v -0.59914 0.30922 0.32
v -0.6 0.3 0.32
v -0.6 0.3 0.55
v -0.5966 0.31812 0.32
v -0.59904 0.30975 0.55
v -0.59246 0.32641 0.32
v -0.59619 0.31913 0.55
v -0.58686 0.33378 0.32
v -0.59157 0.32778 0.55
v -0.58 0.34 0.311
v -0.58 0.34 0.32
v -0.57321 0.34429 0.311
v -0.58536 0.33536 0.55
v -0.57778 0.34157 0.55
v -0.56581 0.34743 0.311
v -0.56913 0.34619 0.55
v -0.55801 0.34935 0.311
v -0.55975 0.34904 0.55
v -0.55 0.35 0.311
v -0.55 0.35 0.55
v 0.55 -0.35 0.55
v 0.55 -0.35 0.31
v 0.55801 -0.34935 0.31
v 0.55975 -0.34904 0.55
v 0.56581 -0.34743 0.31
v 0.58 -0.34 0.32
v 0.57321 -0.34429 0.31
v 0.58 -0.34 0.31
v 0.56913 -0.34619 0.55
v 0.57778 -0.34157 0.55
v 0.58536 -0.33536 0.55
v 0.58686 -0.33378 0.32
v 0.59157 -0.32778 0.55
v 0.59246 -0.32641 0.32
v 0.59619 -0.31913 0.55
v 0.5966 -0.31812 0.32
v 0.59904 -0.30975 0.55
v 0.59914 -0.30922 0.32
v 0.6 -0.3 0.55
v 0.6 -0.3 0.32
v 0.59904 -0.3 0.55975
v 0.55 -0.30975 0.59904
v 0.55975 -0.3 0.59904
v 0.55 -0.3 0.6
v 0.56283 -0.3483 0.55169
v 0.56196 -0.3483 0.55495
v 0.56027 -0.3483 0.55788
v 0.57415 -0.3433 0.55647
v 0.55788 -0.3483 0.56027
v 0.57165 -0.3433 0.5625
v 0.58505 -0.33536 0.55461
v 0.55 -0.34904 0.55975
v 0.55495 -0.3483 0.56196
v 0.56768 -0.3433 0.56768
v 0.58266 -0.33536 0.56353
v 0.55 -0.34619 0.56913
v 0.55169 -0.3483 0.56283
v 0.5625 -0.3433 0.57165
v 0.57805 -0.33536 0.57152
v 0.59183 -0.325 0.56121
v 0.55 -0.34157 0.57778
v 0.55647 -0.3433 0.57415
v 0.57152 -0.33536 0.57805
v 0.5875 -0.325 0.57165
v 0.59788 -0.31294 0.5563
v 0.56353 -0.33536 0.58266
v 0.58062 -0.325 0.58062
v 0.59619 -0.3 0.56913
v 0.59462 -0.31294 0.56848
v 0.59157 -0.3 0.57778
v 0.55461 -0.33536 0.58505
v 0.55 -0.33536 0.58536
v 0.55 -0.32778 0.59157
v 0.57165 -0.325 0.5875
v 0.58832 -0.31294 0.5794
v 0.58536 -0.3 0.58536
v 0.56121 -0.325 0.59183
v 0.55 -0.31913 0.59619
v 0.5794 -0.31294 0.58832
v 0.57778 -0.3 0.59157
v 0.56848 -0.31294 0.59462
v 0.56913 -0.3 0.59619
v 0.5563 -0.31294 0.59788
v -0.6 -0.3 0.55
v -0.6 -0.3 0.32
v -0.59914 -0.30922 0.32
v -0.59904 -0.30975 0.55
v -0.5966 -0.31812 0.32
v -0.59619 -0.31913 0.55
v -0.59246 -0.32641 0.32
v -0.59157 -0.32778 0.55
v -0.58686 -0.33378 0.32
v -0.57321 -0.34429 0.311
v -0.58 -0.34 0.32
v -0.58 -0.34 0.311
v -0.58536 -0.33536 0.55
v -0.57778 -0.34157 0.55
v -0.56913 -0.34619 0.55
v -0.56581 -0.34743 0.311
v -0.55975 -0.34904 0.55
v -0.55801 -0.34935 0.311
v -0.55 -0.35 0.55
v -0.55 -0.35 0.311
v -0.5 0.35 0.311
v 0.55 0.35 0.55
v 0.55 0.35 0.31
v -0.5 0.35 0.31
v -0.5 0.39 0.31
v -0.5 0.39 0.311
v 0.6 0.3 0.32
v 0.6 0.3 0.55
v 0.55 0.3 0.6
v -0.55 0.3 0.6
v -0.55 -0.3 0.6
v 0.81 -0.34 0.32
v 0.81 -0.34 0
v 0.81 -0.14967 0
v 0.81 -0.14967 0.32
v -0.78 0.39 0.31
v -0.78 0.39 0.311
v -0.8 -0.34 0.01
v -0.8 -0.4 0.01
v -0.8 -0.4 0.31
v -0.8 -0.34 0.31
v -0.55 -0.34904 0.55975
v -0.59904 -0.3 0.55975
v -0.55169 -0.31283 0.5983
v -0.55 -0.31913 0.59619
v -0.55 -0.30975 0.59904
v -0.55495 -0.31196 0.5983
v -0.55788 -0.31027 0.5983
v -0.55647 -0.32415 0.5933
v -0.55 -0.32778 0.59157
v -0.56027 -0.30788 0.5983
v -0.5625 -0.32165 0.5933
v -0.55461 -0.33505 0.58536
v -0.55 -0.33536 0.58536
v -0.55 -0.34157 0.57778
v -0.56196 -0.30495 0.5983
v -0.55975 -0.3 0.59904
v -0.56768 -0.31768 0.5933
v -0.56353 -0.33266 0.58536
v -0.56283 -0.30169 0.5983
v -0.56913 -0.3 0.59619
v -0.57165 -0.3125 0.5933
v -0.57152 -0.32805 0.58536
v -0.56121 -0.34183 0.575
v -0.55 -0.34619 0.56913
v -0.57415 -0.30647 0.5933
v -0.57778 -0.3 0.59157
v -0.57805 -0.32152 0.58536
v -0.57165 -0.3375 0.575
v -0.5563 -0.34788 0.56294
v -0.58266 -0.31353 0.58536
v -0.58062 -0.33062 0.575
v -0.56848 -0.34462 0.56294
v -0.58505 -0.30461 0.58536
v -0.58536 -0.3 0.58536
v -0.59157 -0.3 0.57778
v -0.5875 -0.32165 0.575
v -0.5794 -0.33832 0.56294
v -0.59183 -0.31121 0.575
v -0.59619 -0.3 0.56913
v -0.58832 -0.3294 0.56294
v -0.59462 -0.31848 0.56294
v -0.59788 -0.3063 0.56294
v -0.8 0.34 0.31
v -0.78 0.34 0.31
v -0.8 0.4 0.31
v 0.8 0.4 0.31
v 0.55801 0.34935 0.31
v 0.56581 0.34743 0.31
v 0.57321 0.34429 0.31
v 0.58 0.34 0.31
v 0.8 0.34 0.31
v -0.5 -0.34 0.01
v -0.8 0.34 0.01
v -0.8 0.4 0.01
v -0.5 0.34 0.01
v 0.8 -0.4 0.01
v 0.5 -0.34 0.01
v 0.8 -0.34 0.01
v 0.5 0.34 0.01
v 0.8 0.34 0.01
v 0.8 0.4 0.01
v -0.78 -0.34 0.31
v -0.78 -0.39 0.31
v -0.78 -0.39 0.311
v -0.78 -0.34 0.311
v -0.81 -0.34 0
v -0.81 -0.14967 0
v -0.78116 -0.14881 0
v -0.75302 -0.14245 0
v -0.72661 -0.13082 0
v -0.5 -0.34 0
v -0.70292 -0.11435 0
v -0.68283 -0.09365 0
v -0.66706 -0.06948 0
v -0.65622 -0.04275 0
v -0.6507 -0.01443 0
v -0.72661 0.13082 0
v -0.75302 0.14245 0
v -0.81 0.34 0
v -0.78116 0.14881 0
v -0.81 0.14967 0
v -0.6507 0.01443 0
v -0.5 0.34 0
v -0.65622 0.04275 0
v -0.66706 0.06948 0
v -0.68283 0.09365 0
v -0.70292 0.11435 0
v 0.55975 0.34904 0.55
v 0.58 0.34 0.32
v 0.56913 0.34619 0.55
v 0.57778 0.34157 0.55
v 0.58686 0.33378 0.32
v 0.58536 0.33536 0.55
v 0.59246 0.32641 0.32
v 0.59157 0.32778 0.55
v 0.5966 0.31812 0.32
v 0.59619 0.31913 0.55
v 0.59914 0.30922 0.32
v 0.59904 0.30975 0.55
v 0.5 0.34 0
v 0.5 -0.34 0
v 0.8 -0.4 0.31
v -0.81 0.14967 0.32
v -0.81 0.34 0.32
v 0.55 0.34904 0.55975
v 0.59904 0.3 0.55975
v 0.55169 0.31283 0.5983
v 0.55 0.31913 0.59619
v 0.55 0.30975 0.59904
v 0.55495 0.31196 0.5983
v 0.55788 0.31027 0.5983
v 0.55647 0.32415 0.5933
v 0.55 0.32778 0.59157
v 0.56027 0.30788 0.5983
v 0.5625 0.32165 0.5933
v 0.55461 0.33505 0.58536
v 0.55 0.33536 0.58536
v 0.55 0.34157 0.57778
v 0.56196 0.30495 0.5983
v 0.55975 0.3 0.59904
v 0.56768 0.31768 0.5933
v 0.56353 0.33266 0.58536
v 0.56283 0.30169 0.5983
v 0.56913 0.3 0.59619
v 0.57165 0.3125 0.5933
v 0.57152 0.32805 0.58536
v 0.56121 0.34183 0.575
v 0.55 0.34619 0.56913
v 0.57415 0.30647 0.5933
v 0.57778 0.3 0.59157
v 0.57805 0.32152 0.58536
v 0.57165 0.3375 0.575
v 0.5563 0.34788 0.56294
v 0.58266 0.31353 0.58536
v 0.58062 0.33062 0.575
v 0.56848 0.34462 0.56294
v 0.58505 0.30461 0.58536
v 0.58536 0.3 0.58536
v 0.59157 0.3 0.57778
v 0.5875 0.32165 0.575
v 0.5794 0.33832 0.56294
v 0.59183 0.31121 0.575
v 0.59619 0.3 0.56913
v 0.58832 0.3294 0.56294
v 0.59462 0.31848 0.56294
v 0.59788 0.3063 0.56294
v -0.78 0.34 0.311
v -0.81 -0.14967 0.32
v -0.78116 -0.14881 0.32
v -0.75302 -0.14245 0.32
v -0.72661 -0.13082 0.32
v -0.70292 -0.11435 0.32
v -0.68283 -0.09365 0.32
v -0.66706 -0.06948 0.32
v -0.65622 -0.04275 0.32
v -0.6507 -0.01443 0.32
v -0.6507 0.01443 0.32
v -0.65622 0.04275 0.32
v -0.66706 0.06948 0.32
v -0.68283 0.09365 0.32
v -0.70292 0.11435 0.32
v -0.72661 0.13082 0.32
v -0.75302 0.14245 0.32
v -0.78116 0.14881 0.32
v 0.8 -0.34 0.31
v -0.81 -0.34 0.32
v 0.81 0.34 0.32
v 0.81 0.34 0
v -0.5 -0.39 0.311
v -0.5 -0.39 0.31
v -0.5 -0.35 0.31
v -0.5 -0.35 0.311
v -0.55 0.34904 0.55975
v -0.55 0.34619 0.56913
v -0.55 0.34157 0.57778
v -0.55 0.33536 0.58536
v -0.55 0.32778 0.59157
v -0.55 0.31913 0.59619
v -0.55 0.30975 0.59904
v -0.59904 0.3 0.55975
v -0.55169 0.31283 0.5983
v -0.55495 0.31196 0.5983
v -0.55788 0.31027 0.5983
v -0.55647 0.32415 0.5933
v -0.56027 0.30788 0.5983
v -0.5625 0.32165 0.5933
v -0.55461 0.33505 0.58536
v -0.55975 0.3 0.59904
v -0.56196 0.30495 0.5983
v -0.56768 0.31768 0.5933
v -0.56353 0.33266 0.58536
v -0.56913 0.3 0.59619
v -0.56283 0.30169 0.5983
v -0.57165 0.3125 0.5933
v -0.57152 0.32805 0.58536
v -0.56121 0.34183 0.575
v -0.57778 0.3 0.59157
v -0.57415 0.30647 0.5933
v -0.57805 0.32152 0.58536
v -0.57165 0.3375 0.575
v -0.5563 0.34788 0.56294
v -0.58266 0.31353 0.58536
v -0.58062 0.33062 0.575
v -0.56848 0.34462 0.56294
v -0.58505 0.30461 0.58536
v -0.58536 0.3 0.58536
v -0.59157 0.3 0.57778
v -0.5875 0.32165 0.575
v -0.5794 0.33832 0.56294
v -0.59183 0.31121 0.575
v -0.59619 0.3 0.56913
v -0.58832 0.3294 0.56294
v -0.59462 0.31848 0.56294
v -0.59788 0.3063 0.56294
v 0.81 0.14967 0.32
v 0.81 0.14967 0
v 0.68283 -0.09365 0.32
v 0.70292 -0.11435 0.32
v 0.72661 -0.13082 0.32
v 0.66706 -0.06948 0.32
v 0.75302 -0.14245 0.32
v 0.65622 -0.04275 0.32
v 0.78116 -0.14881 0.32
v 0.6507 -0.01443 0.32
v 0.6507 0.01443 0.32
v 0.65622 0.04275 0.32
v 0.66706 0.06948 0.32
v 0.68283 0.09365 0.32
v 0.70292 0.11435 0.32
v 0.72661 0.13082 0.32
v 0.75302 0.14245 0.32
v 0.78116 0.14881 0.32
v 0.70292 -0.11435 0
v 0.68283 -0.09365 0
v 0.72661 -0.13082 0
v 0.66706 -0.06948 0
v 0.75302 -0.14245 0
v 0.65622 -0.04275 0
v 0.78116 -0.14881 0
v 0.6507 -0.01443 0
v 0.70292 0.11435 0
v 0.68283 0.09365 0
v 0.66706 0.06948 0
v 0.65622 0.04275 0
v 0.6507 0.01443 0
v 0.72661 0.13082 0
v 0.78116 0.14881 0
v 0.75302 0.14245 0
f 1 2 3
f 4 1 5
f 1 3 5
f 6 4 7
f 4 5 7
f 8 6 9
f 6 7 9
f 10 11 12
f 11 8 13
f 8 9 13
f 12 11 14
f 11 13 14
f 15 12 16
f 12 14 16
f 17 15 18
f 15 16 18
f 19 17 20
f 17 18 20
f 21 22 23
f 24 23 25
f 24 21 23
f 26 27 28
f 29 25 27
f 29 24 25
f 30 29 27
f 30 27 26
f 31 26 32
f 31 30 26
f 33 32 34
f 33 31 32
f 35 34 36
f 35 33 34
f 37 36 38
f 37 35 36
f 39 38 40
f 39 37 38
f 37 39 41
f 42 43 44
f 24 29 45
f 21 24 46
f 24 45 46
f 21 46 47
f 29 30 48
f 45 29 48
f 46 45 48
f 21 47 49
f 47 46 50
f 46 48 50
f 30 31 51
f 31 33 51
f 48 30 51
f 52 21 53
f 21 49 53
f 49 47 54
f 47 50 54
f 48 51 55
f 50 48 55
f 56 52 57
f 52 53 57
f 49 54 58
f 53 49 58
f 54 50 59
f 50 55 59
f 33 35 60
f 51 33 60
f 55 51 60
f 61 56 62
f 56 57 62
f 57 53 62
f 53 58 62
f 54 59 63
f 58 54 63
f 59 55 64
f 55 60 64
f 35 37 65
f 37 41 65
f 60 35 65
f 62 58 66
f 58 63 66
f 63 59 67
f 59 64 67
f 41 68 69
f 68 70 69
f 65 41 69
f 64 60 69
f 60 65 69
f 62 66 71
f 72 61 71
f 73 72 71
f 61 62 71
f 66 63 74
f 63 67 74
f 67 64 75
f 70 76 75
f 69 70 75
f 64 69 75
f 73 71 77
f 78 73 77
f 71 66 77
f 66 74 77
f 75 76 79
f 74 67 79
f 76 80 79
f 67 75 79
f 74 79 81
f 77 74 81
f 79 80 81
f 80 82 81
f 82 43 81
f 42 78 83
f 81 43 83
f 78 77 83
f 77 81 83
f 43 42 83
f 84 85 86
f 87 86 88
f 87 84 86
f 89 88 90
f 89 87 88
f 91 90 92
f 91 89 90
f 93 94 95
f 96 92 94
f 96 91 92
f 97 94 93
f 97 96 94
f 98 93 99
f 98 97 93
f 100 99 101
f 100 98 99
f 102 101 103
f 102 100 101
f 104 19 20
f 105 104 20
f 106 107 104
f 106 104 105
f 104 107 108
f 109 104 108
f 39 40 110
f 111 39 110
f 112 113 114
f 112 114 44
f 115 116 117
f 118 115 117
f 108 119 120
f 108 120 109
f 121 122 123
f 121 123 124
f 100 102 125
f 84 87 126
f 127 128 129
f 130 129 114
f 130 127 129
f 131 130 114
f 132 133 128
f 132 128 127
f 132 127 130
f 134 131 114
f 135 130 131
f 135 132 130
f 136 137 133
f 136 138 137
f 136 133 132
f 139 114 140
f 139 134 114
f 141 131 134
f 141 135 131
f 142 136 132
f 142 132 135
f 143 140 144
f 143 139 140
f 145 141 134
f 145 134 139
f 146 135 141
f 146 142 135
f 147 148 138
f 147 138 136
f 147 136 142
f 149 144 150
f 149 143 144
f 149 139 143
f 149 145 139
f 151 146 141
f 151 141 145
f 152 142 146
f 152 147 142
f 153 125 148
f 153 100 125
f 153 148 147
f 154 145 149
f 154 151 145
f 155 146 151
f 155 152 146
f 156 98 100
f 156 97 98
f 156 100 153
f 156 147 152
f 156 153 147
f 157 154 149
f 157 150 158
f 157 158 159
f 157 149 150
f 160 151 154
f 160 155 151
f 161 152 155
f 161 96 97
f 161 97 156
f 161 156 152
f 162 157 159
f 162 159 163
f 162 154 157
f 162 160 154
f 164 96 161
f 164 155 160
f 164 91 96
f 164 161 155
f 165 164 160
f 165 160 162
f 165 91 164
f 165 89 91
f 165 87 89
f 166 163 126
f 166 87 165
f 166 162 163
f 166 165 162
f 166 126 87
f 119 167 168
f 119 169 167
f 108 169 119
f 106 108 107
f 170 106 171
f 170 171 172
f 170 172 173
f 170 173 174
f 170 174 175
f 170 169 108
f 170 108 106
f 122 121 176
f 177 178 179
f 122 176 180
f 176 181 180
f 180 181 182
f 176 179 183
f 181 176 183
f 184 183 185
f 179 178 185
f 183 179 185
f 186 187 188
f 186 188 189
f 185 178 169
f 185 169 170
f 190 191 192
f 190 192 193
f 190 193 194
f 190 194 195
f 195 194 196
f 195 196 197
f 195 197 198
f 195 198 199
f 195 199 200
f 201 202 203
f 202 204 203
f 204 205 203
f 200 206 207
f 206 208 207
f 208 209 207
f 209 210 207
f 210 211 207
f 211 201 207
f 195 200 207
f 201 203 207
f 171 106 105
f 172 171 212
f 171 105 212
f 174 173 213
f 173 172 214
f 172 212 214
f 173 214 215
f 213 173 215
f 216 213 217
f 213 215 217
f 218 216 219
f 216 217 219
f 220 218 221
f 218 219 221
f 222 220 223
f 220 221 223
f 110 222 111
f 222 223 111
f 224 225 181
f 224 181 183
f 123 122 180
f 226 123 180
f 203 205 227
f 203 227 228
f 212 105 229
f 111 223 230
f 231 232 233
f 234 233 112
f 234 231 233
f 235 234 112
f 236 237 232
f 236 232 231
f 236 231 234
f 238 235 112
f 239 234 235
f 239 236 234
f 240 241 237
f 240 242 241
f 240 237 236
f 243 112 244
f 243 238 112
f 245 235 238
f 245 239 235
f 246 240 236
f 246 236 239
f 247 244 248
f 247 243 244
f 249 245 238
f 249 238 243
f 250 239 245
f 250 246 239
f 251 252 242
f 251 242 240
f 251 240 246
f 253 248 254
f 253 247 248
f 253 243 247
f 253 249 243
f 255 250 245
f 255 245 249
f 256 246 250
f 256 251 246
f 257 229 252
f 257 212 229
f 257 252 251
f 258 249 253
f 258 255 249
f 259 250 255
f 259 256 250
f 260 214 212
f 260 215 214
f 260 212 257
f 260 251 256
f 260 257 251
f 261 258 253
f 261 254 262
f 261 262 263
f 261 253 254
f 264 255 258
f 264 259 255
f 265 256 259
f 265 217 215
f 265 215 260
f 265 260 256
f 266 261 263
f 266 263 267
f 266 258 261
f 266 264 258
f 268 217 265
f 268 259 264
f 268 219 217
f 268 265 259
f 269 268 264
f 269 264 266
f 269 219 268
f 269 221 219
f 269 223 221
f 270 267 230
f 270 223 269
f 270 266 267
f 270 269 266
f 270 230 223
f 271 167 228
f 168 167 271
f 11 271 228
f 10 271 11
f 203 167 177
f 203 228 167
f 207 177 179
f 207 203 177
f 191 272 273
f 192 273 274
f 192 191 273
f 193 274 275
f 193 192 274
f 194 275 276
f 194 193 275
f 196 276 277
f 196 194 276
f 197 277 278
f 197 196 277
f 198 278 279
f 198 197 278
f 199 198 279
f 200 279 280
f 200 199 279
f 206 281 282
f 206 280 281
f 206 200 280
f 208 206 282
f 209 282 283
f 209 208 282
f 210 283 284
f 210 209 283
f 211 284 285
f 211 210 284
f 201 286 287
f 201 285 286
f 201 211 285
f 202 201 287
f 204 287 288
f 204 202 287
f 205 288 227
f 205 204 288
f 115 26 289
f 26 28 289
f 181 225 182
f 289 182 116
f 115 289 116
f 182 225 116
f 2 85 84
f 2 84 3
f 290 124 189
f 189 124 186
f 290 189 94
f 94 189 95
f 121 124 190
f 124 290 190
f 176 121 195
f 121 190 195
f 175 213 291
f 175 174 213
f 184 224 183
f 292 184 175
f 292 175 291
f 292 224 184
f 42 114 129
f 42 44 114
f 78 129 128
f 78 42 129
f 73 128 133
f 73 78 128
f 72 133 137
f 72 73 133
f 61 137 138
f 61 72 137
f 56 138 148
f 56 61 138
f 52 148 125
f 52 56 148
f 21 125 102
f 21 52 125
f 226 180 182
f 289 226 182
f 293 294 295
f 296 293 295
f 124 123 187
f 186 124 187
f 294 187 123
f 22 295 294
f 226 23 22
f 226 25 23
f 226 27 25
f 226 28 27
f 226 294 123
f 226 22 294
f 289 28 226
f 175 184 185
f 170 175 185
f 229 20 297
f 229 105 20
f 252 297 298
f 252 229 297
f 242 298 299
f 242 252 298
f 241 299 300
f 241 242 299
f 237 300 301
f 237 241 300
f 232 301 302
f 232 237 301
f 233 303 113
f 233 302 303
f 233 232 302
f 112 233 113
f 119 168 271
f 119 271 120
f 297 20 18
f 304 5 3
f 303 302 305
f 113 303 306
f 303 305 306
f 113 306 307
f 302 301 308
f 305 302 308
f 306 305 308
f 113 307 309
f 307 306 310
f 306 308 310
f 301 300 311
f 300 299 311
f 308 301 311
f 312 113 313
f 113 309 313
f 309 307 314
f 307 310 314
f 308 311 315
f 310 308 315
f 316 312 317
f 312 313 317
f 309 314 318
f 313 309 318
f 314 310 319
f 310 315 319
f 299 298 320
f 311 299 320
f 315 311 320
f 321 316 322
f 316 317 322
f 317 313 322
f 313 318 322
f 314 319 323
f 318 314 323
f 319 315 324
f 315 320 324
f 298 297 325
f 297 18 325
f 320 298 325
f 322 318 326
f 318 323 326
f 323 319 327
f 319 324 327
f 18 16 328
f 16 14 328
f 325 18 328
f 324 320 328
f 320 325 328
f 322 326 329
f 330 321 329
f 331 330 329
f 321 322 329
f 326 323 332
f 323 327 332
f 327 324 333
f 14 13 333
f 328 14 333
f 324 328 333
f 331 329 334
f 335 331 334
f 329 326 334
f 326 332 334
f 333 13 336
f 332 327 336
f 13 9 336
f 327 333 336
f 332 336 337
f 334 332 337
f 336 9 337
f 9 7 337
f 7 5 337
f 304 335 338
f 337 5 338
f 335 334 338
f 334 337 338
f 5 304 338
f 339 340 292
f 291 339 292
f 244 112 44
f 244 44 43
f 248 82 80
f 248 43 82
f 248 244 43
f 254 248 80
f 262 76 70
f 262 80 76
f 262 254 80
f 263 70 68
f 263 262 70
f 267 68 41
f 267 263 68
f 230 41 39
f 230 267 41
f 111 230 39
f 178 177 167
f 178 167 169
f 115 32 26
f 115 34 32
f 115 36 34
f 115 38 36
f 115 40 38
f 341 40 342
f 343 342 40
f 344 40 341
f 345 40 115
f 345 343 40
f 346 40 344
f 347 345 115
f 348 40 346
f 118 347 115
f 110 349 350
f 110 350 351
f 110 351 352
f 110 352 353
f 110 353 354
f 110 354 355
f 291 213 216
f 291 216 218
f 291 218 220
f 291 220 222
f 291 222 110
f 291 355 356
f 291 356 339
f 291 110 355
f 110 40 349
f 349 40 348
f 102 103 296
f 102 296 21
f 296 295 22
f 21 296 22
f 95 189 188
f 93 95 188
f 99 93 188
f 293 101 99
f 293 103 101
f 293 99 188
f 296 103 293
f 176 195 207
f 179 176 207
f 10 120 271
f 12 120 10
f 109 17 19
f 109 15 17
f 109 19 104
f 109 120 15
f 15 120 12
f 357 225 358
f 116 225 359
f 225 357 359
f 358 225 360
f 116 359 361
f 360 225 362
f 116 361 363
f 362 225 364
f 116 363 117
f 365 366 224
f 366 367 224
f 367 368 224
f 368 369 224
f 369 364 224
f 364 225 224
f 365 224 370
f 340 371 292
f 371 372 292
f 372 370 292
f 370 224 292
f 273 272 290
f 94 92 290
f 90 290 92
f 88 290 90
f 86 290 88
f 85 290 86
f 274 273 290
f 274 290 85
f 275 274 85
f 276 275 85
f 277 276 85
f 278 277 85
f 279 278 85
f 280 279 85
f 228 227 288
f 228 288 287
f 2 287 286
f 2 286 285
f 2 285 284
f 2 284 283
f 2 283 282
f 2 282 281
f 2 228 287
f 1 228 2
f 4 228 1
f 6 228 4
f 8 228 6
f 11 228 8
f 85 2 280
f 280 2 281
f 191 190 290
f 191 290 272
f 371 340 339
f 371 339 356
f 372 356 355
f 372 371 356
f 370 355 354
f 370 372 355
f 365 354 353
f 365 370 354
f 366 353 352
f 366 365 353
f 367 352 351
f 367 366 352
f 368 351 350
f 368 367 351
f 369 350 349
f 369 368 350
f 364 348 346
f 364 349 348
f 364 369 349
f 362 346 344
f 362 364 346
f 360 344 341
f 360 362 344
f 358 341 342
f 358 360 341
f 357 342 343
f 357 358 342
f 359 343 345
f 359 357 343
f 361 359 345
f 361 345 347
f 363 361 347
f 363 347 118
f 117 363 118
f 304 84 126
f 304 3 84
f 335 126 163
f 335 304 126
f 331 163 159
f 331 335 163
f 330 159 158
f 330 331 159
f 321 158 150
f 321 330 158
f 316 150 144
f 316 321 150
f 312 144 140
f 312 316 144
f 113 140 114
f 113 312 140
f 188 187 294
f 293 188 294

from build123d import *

# Parameters (mm, degrees)
EXTRUDE_START       = 0.01
SKETCH_2_W          = 1.6
SKETCH_2_H          = 0.8
EXTRUDE_1_DEPTH     = 0.3
SKETCH_3_W          = 0.31
SKETCH_3_H          = 0.68
EXTRUDE_2_DEPTH     = 0.32
EXTRUDE_START_2     = 0.3
SKETCH_4_W          = 1.2
SKETCH_4_H          = 0.7
EXTRUDE_3_DEPTH     = 0.3
FILLET_1_R          = 0.05
SKETCH_5_W          = 0.28
SKETCH_5_H          = 0.78
EXTRUDE_4_DEPTH     = 0.001
SKETCH_6_R          = 0.15
CUT_EXTRUDE_2_DEPTH = 0.52


with BuildPart() as part:
    # Эскиз2 → Бобышка-Вытянуть1 (new body)
    with BuildSketch(Plane.XY.offset(EXTRUDE_START)):
        Rectangle(SKETCH_2_W, SKETCH_2_H)
    extrude(amount=EXTRUDE_1_DEPTH)

    # Эскиз3 → Бобышка-Вытянуть2 (add)
    with BuildSketch(Plane.XY):
        with Locations((-0.655, 0)):
            Rectangle(SKETCH_3_W, SKETCH_3_H)
        with Locations((0.655, 0)):
            Rectangle(SKETCH_3_W, SKETCH_3_H)
    extrude(amount=EXTRUDE_2_DEPTH)

    # Эскиз4 → Бобышка-Вытянуть3 (add)
    with BuildSketch(Plane.XY.offset(EXTRUDE_START_2)):
        Rectangle(SKETCH_4_W, SKETCH_4_H)
    extrude(amount=EXTRUDE_3_DEPTH)

    # Скругление1
    fillet_1_edges = [part.edges().sort_by_distance(p)[0] for p in [
        (0.6, 0.35, 0.455),
        (-0.6, 0.35, 0.455),
        (0, 0.35, 0.6),
        (0.6, 0, 0.6),
        (0.6, -0.35, 0.455),
        (-0.6, -0.35, 0.455),
        (0, -0.35, 0.6),
        (-0.6, 0, 0.6),
    ]]
    fillet(fillet_1_edges, radius=FILLET_1_R)

    # Эскиз5 → Бобышка-Вытянуть4 (add)
    with BuildSketch(Plane.XY.offset(0.31)):
        with Locations((-0.64, 0)):
            Rectangle(SKETCH_5_W, SKETCH_5_H)
    extrude(amount=EXTRUDE_4_DEPTH)

    # Эскиз6 → Вырез-Вытянуть2 (cut)
    with BuildSketch(Plane.XY):
        with Locations((-0.8, 0)):
            Circle(SKETCH_6_R)
        with Locations((0.8, 0)):
            Circle(SKETCH_6_R)
    extrude(amount=CUT_EXTRUDE_2_DEPTH, mode=Mode.SUBTRACT)


solid = part.part
